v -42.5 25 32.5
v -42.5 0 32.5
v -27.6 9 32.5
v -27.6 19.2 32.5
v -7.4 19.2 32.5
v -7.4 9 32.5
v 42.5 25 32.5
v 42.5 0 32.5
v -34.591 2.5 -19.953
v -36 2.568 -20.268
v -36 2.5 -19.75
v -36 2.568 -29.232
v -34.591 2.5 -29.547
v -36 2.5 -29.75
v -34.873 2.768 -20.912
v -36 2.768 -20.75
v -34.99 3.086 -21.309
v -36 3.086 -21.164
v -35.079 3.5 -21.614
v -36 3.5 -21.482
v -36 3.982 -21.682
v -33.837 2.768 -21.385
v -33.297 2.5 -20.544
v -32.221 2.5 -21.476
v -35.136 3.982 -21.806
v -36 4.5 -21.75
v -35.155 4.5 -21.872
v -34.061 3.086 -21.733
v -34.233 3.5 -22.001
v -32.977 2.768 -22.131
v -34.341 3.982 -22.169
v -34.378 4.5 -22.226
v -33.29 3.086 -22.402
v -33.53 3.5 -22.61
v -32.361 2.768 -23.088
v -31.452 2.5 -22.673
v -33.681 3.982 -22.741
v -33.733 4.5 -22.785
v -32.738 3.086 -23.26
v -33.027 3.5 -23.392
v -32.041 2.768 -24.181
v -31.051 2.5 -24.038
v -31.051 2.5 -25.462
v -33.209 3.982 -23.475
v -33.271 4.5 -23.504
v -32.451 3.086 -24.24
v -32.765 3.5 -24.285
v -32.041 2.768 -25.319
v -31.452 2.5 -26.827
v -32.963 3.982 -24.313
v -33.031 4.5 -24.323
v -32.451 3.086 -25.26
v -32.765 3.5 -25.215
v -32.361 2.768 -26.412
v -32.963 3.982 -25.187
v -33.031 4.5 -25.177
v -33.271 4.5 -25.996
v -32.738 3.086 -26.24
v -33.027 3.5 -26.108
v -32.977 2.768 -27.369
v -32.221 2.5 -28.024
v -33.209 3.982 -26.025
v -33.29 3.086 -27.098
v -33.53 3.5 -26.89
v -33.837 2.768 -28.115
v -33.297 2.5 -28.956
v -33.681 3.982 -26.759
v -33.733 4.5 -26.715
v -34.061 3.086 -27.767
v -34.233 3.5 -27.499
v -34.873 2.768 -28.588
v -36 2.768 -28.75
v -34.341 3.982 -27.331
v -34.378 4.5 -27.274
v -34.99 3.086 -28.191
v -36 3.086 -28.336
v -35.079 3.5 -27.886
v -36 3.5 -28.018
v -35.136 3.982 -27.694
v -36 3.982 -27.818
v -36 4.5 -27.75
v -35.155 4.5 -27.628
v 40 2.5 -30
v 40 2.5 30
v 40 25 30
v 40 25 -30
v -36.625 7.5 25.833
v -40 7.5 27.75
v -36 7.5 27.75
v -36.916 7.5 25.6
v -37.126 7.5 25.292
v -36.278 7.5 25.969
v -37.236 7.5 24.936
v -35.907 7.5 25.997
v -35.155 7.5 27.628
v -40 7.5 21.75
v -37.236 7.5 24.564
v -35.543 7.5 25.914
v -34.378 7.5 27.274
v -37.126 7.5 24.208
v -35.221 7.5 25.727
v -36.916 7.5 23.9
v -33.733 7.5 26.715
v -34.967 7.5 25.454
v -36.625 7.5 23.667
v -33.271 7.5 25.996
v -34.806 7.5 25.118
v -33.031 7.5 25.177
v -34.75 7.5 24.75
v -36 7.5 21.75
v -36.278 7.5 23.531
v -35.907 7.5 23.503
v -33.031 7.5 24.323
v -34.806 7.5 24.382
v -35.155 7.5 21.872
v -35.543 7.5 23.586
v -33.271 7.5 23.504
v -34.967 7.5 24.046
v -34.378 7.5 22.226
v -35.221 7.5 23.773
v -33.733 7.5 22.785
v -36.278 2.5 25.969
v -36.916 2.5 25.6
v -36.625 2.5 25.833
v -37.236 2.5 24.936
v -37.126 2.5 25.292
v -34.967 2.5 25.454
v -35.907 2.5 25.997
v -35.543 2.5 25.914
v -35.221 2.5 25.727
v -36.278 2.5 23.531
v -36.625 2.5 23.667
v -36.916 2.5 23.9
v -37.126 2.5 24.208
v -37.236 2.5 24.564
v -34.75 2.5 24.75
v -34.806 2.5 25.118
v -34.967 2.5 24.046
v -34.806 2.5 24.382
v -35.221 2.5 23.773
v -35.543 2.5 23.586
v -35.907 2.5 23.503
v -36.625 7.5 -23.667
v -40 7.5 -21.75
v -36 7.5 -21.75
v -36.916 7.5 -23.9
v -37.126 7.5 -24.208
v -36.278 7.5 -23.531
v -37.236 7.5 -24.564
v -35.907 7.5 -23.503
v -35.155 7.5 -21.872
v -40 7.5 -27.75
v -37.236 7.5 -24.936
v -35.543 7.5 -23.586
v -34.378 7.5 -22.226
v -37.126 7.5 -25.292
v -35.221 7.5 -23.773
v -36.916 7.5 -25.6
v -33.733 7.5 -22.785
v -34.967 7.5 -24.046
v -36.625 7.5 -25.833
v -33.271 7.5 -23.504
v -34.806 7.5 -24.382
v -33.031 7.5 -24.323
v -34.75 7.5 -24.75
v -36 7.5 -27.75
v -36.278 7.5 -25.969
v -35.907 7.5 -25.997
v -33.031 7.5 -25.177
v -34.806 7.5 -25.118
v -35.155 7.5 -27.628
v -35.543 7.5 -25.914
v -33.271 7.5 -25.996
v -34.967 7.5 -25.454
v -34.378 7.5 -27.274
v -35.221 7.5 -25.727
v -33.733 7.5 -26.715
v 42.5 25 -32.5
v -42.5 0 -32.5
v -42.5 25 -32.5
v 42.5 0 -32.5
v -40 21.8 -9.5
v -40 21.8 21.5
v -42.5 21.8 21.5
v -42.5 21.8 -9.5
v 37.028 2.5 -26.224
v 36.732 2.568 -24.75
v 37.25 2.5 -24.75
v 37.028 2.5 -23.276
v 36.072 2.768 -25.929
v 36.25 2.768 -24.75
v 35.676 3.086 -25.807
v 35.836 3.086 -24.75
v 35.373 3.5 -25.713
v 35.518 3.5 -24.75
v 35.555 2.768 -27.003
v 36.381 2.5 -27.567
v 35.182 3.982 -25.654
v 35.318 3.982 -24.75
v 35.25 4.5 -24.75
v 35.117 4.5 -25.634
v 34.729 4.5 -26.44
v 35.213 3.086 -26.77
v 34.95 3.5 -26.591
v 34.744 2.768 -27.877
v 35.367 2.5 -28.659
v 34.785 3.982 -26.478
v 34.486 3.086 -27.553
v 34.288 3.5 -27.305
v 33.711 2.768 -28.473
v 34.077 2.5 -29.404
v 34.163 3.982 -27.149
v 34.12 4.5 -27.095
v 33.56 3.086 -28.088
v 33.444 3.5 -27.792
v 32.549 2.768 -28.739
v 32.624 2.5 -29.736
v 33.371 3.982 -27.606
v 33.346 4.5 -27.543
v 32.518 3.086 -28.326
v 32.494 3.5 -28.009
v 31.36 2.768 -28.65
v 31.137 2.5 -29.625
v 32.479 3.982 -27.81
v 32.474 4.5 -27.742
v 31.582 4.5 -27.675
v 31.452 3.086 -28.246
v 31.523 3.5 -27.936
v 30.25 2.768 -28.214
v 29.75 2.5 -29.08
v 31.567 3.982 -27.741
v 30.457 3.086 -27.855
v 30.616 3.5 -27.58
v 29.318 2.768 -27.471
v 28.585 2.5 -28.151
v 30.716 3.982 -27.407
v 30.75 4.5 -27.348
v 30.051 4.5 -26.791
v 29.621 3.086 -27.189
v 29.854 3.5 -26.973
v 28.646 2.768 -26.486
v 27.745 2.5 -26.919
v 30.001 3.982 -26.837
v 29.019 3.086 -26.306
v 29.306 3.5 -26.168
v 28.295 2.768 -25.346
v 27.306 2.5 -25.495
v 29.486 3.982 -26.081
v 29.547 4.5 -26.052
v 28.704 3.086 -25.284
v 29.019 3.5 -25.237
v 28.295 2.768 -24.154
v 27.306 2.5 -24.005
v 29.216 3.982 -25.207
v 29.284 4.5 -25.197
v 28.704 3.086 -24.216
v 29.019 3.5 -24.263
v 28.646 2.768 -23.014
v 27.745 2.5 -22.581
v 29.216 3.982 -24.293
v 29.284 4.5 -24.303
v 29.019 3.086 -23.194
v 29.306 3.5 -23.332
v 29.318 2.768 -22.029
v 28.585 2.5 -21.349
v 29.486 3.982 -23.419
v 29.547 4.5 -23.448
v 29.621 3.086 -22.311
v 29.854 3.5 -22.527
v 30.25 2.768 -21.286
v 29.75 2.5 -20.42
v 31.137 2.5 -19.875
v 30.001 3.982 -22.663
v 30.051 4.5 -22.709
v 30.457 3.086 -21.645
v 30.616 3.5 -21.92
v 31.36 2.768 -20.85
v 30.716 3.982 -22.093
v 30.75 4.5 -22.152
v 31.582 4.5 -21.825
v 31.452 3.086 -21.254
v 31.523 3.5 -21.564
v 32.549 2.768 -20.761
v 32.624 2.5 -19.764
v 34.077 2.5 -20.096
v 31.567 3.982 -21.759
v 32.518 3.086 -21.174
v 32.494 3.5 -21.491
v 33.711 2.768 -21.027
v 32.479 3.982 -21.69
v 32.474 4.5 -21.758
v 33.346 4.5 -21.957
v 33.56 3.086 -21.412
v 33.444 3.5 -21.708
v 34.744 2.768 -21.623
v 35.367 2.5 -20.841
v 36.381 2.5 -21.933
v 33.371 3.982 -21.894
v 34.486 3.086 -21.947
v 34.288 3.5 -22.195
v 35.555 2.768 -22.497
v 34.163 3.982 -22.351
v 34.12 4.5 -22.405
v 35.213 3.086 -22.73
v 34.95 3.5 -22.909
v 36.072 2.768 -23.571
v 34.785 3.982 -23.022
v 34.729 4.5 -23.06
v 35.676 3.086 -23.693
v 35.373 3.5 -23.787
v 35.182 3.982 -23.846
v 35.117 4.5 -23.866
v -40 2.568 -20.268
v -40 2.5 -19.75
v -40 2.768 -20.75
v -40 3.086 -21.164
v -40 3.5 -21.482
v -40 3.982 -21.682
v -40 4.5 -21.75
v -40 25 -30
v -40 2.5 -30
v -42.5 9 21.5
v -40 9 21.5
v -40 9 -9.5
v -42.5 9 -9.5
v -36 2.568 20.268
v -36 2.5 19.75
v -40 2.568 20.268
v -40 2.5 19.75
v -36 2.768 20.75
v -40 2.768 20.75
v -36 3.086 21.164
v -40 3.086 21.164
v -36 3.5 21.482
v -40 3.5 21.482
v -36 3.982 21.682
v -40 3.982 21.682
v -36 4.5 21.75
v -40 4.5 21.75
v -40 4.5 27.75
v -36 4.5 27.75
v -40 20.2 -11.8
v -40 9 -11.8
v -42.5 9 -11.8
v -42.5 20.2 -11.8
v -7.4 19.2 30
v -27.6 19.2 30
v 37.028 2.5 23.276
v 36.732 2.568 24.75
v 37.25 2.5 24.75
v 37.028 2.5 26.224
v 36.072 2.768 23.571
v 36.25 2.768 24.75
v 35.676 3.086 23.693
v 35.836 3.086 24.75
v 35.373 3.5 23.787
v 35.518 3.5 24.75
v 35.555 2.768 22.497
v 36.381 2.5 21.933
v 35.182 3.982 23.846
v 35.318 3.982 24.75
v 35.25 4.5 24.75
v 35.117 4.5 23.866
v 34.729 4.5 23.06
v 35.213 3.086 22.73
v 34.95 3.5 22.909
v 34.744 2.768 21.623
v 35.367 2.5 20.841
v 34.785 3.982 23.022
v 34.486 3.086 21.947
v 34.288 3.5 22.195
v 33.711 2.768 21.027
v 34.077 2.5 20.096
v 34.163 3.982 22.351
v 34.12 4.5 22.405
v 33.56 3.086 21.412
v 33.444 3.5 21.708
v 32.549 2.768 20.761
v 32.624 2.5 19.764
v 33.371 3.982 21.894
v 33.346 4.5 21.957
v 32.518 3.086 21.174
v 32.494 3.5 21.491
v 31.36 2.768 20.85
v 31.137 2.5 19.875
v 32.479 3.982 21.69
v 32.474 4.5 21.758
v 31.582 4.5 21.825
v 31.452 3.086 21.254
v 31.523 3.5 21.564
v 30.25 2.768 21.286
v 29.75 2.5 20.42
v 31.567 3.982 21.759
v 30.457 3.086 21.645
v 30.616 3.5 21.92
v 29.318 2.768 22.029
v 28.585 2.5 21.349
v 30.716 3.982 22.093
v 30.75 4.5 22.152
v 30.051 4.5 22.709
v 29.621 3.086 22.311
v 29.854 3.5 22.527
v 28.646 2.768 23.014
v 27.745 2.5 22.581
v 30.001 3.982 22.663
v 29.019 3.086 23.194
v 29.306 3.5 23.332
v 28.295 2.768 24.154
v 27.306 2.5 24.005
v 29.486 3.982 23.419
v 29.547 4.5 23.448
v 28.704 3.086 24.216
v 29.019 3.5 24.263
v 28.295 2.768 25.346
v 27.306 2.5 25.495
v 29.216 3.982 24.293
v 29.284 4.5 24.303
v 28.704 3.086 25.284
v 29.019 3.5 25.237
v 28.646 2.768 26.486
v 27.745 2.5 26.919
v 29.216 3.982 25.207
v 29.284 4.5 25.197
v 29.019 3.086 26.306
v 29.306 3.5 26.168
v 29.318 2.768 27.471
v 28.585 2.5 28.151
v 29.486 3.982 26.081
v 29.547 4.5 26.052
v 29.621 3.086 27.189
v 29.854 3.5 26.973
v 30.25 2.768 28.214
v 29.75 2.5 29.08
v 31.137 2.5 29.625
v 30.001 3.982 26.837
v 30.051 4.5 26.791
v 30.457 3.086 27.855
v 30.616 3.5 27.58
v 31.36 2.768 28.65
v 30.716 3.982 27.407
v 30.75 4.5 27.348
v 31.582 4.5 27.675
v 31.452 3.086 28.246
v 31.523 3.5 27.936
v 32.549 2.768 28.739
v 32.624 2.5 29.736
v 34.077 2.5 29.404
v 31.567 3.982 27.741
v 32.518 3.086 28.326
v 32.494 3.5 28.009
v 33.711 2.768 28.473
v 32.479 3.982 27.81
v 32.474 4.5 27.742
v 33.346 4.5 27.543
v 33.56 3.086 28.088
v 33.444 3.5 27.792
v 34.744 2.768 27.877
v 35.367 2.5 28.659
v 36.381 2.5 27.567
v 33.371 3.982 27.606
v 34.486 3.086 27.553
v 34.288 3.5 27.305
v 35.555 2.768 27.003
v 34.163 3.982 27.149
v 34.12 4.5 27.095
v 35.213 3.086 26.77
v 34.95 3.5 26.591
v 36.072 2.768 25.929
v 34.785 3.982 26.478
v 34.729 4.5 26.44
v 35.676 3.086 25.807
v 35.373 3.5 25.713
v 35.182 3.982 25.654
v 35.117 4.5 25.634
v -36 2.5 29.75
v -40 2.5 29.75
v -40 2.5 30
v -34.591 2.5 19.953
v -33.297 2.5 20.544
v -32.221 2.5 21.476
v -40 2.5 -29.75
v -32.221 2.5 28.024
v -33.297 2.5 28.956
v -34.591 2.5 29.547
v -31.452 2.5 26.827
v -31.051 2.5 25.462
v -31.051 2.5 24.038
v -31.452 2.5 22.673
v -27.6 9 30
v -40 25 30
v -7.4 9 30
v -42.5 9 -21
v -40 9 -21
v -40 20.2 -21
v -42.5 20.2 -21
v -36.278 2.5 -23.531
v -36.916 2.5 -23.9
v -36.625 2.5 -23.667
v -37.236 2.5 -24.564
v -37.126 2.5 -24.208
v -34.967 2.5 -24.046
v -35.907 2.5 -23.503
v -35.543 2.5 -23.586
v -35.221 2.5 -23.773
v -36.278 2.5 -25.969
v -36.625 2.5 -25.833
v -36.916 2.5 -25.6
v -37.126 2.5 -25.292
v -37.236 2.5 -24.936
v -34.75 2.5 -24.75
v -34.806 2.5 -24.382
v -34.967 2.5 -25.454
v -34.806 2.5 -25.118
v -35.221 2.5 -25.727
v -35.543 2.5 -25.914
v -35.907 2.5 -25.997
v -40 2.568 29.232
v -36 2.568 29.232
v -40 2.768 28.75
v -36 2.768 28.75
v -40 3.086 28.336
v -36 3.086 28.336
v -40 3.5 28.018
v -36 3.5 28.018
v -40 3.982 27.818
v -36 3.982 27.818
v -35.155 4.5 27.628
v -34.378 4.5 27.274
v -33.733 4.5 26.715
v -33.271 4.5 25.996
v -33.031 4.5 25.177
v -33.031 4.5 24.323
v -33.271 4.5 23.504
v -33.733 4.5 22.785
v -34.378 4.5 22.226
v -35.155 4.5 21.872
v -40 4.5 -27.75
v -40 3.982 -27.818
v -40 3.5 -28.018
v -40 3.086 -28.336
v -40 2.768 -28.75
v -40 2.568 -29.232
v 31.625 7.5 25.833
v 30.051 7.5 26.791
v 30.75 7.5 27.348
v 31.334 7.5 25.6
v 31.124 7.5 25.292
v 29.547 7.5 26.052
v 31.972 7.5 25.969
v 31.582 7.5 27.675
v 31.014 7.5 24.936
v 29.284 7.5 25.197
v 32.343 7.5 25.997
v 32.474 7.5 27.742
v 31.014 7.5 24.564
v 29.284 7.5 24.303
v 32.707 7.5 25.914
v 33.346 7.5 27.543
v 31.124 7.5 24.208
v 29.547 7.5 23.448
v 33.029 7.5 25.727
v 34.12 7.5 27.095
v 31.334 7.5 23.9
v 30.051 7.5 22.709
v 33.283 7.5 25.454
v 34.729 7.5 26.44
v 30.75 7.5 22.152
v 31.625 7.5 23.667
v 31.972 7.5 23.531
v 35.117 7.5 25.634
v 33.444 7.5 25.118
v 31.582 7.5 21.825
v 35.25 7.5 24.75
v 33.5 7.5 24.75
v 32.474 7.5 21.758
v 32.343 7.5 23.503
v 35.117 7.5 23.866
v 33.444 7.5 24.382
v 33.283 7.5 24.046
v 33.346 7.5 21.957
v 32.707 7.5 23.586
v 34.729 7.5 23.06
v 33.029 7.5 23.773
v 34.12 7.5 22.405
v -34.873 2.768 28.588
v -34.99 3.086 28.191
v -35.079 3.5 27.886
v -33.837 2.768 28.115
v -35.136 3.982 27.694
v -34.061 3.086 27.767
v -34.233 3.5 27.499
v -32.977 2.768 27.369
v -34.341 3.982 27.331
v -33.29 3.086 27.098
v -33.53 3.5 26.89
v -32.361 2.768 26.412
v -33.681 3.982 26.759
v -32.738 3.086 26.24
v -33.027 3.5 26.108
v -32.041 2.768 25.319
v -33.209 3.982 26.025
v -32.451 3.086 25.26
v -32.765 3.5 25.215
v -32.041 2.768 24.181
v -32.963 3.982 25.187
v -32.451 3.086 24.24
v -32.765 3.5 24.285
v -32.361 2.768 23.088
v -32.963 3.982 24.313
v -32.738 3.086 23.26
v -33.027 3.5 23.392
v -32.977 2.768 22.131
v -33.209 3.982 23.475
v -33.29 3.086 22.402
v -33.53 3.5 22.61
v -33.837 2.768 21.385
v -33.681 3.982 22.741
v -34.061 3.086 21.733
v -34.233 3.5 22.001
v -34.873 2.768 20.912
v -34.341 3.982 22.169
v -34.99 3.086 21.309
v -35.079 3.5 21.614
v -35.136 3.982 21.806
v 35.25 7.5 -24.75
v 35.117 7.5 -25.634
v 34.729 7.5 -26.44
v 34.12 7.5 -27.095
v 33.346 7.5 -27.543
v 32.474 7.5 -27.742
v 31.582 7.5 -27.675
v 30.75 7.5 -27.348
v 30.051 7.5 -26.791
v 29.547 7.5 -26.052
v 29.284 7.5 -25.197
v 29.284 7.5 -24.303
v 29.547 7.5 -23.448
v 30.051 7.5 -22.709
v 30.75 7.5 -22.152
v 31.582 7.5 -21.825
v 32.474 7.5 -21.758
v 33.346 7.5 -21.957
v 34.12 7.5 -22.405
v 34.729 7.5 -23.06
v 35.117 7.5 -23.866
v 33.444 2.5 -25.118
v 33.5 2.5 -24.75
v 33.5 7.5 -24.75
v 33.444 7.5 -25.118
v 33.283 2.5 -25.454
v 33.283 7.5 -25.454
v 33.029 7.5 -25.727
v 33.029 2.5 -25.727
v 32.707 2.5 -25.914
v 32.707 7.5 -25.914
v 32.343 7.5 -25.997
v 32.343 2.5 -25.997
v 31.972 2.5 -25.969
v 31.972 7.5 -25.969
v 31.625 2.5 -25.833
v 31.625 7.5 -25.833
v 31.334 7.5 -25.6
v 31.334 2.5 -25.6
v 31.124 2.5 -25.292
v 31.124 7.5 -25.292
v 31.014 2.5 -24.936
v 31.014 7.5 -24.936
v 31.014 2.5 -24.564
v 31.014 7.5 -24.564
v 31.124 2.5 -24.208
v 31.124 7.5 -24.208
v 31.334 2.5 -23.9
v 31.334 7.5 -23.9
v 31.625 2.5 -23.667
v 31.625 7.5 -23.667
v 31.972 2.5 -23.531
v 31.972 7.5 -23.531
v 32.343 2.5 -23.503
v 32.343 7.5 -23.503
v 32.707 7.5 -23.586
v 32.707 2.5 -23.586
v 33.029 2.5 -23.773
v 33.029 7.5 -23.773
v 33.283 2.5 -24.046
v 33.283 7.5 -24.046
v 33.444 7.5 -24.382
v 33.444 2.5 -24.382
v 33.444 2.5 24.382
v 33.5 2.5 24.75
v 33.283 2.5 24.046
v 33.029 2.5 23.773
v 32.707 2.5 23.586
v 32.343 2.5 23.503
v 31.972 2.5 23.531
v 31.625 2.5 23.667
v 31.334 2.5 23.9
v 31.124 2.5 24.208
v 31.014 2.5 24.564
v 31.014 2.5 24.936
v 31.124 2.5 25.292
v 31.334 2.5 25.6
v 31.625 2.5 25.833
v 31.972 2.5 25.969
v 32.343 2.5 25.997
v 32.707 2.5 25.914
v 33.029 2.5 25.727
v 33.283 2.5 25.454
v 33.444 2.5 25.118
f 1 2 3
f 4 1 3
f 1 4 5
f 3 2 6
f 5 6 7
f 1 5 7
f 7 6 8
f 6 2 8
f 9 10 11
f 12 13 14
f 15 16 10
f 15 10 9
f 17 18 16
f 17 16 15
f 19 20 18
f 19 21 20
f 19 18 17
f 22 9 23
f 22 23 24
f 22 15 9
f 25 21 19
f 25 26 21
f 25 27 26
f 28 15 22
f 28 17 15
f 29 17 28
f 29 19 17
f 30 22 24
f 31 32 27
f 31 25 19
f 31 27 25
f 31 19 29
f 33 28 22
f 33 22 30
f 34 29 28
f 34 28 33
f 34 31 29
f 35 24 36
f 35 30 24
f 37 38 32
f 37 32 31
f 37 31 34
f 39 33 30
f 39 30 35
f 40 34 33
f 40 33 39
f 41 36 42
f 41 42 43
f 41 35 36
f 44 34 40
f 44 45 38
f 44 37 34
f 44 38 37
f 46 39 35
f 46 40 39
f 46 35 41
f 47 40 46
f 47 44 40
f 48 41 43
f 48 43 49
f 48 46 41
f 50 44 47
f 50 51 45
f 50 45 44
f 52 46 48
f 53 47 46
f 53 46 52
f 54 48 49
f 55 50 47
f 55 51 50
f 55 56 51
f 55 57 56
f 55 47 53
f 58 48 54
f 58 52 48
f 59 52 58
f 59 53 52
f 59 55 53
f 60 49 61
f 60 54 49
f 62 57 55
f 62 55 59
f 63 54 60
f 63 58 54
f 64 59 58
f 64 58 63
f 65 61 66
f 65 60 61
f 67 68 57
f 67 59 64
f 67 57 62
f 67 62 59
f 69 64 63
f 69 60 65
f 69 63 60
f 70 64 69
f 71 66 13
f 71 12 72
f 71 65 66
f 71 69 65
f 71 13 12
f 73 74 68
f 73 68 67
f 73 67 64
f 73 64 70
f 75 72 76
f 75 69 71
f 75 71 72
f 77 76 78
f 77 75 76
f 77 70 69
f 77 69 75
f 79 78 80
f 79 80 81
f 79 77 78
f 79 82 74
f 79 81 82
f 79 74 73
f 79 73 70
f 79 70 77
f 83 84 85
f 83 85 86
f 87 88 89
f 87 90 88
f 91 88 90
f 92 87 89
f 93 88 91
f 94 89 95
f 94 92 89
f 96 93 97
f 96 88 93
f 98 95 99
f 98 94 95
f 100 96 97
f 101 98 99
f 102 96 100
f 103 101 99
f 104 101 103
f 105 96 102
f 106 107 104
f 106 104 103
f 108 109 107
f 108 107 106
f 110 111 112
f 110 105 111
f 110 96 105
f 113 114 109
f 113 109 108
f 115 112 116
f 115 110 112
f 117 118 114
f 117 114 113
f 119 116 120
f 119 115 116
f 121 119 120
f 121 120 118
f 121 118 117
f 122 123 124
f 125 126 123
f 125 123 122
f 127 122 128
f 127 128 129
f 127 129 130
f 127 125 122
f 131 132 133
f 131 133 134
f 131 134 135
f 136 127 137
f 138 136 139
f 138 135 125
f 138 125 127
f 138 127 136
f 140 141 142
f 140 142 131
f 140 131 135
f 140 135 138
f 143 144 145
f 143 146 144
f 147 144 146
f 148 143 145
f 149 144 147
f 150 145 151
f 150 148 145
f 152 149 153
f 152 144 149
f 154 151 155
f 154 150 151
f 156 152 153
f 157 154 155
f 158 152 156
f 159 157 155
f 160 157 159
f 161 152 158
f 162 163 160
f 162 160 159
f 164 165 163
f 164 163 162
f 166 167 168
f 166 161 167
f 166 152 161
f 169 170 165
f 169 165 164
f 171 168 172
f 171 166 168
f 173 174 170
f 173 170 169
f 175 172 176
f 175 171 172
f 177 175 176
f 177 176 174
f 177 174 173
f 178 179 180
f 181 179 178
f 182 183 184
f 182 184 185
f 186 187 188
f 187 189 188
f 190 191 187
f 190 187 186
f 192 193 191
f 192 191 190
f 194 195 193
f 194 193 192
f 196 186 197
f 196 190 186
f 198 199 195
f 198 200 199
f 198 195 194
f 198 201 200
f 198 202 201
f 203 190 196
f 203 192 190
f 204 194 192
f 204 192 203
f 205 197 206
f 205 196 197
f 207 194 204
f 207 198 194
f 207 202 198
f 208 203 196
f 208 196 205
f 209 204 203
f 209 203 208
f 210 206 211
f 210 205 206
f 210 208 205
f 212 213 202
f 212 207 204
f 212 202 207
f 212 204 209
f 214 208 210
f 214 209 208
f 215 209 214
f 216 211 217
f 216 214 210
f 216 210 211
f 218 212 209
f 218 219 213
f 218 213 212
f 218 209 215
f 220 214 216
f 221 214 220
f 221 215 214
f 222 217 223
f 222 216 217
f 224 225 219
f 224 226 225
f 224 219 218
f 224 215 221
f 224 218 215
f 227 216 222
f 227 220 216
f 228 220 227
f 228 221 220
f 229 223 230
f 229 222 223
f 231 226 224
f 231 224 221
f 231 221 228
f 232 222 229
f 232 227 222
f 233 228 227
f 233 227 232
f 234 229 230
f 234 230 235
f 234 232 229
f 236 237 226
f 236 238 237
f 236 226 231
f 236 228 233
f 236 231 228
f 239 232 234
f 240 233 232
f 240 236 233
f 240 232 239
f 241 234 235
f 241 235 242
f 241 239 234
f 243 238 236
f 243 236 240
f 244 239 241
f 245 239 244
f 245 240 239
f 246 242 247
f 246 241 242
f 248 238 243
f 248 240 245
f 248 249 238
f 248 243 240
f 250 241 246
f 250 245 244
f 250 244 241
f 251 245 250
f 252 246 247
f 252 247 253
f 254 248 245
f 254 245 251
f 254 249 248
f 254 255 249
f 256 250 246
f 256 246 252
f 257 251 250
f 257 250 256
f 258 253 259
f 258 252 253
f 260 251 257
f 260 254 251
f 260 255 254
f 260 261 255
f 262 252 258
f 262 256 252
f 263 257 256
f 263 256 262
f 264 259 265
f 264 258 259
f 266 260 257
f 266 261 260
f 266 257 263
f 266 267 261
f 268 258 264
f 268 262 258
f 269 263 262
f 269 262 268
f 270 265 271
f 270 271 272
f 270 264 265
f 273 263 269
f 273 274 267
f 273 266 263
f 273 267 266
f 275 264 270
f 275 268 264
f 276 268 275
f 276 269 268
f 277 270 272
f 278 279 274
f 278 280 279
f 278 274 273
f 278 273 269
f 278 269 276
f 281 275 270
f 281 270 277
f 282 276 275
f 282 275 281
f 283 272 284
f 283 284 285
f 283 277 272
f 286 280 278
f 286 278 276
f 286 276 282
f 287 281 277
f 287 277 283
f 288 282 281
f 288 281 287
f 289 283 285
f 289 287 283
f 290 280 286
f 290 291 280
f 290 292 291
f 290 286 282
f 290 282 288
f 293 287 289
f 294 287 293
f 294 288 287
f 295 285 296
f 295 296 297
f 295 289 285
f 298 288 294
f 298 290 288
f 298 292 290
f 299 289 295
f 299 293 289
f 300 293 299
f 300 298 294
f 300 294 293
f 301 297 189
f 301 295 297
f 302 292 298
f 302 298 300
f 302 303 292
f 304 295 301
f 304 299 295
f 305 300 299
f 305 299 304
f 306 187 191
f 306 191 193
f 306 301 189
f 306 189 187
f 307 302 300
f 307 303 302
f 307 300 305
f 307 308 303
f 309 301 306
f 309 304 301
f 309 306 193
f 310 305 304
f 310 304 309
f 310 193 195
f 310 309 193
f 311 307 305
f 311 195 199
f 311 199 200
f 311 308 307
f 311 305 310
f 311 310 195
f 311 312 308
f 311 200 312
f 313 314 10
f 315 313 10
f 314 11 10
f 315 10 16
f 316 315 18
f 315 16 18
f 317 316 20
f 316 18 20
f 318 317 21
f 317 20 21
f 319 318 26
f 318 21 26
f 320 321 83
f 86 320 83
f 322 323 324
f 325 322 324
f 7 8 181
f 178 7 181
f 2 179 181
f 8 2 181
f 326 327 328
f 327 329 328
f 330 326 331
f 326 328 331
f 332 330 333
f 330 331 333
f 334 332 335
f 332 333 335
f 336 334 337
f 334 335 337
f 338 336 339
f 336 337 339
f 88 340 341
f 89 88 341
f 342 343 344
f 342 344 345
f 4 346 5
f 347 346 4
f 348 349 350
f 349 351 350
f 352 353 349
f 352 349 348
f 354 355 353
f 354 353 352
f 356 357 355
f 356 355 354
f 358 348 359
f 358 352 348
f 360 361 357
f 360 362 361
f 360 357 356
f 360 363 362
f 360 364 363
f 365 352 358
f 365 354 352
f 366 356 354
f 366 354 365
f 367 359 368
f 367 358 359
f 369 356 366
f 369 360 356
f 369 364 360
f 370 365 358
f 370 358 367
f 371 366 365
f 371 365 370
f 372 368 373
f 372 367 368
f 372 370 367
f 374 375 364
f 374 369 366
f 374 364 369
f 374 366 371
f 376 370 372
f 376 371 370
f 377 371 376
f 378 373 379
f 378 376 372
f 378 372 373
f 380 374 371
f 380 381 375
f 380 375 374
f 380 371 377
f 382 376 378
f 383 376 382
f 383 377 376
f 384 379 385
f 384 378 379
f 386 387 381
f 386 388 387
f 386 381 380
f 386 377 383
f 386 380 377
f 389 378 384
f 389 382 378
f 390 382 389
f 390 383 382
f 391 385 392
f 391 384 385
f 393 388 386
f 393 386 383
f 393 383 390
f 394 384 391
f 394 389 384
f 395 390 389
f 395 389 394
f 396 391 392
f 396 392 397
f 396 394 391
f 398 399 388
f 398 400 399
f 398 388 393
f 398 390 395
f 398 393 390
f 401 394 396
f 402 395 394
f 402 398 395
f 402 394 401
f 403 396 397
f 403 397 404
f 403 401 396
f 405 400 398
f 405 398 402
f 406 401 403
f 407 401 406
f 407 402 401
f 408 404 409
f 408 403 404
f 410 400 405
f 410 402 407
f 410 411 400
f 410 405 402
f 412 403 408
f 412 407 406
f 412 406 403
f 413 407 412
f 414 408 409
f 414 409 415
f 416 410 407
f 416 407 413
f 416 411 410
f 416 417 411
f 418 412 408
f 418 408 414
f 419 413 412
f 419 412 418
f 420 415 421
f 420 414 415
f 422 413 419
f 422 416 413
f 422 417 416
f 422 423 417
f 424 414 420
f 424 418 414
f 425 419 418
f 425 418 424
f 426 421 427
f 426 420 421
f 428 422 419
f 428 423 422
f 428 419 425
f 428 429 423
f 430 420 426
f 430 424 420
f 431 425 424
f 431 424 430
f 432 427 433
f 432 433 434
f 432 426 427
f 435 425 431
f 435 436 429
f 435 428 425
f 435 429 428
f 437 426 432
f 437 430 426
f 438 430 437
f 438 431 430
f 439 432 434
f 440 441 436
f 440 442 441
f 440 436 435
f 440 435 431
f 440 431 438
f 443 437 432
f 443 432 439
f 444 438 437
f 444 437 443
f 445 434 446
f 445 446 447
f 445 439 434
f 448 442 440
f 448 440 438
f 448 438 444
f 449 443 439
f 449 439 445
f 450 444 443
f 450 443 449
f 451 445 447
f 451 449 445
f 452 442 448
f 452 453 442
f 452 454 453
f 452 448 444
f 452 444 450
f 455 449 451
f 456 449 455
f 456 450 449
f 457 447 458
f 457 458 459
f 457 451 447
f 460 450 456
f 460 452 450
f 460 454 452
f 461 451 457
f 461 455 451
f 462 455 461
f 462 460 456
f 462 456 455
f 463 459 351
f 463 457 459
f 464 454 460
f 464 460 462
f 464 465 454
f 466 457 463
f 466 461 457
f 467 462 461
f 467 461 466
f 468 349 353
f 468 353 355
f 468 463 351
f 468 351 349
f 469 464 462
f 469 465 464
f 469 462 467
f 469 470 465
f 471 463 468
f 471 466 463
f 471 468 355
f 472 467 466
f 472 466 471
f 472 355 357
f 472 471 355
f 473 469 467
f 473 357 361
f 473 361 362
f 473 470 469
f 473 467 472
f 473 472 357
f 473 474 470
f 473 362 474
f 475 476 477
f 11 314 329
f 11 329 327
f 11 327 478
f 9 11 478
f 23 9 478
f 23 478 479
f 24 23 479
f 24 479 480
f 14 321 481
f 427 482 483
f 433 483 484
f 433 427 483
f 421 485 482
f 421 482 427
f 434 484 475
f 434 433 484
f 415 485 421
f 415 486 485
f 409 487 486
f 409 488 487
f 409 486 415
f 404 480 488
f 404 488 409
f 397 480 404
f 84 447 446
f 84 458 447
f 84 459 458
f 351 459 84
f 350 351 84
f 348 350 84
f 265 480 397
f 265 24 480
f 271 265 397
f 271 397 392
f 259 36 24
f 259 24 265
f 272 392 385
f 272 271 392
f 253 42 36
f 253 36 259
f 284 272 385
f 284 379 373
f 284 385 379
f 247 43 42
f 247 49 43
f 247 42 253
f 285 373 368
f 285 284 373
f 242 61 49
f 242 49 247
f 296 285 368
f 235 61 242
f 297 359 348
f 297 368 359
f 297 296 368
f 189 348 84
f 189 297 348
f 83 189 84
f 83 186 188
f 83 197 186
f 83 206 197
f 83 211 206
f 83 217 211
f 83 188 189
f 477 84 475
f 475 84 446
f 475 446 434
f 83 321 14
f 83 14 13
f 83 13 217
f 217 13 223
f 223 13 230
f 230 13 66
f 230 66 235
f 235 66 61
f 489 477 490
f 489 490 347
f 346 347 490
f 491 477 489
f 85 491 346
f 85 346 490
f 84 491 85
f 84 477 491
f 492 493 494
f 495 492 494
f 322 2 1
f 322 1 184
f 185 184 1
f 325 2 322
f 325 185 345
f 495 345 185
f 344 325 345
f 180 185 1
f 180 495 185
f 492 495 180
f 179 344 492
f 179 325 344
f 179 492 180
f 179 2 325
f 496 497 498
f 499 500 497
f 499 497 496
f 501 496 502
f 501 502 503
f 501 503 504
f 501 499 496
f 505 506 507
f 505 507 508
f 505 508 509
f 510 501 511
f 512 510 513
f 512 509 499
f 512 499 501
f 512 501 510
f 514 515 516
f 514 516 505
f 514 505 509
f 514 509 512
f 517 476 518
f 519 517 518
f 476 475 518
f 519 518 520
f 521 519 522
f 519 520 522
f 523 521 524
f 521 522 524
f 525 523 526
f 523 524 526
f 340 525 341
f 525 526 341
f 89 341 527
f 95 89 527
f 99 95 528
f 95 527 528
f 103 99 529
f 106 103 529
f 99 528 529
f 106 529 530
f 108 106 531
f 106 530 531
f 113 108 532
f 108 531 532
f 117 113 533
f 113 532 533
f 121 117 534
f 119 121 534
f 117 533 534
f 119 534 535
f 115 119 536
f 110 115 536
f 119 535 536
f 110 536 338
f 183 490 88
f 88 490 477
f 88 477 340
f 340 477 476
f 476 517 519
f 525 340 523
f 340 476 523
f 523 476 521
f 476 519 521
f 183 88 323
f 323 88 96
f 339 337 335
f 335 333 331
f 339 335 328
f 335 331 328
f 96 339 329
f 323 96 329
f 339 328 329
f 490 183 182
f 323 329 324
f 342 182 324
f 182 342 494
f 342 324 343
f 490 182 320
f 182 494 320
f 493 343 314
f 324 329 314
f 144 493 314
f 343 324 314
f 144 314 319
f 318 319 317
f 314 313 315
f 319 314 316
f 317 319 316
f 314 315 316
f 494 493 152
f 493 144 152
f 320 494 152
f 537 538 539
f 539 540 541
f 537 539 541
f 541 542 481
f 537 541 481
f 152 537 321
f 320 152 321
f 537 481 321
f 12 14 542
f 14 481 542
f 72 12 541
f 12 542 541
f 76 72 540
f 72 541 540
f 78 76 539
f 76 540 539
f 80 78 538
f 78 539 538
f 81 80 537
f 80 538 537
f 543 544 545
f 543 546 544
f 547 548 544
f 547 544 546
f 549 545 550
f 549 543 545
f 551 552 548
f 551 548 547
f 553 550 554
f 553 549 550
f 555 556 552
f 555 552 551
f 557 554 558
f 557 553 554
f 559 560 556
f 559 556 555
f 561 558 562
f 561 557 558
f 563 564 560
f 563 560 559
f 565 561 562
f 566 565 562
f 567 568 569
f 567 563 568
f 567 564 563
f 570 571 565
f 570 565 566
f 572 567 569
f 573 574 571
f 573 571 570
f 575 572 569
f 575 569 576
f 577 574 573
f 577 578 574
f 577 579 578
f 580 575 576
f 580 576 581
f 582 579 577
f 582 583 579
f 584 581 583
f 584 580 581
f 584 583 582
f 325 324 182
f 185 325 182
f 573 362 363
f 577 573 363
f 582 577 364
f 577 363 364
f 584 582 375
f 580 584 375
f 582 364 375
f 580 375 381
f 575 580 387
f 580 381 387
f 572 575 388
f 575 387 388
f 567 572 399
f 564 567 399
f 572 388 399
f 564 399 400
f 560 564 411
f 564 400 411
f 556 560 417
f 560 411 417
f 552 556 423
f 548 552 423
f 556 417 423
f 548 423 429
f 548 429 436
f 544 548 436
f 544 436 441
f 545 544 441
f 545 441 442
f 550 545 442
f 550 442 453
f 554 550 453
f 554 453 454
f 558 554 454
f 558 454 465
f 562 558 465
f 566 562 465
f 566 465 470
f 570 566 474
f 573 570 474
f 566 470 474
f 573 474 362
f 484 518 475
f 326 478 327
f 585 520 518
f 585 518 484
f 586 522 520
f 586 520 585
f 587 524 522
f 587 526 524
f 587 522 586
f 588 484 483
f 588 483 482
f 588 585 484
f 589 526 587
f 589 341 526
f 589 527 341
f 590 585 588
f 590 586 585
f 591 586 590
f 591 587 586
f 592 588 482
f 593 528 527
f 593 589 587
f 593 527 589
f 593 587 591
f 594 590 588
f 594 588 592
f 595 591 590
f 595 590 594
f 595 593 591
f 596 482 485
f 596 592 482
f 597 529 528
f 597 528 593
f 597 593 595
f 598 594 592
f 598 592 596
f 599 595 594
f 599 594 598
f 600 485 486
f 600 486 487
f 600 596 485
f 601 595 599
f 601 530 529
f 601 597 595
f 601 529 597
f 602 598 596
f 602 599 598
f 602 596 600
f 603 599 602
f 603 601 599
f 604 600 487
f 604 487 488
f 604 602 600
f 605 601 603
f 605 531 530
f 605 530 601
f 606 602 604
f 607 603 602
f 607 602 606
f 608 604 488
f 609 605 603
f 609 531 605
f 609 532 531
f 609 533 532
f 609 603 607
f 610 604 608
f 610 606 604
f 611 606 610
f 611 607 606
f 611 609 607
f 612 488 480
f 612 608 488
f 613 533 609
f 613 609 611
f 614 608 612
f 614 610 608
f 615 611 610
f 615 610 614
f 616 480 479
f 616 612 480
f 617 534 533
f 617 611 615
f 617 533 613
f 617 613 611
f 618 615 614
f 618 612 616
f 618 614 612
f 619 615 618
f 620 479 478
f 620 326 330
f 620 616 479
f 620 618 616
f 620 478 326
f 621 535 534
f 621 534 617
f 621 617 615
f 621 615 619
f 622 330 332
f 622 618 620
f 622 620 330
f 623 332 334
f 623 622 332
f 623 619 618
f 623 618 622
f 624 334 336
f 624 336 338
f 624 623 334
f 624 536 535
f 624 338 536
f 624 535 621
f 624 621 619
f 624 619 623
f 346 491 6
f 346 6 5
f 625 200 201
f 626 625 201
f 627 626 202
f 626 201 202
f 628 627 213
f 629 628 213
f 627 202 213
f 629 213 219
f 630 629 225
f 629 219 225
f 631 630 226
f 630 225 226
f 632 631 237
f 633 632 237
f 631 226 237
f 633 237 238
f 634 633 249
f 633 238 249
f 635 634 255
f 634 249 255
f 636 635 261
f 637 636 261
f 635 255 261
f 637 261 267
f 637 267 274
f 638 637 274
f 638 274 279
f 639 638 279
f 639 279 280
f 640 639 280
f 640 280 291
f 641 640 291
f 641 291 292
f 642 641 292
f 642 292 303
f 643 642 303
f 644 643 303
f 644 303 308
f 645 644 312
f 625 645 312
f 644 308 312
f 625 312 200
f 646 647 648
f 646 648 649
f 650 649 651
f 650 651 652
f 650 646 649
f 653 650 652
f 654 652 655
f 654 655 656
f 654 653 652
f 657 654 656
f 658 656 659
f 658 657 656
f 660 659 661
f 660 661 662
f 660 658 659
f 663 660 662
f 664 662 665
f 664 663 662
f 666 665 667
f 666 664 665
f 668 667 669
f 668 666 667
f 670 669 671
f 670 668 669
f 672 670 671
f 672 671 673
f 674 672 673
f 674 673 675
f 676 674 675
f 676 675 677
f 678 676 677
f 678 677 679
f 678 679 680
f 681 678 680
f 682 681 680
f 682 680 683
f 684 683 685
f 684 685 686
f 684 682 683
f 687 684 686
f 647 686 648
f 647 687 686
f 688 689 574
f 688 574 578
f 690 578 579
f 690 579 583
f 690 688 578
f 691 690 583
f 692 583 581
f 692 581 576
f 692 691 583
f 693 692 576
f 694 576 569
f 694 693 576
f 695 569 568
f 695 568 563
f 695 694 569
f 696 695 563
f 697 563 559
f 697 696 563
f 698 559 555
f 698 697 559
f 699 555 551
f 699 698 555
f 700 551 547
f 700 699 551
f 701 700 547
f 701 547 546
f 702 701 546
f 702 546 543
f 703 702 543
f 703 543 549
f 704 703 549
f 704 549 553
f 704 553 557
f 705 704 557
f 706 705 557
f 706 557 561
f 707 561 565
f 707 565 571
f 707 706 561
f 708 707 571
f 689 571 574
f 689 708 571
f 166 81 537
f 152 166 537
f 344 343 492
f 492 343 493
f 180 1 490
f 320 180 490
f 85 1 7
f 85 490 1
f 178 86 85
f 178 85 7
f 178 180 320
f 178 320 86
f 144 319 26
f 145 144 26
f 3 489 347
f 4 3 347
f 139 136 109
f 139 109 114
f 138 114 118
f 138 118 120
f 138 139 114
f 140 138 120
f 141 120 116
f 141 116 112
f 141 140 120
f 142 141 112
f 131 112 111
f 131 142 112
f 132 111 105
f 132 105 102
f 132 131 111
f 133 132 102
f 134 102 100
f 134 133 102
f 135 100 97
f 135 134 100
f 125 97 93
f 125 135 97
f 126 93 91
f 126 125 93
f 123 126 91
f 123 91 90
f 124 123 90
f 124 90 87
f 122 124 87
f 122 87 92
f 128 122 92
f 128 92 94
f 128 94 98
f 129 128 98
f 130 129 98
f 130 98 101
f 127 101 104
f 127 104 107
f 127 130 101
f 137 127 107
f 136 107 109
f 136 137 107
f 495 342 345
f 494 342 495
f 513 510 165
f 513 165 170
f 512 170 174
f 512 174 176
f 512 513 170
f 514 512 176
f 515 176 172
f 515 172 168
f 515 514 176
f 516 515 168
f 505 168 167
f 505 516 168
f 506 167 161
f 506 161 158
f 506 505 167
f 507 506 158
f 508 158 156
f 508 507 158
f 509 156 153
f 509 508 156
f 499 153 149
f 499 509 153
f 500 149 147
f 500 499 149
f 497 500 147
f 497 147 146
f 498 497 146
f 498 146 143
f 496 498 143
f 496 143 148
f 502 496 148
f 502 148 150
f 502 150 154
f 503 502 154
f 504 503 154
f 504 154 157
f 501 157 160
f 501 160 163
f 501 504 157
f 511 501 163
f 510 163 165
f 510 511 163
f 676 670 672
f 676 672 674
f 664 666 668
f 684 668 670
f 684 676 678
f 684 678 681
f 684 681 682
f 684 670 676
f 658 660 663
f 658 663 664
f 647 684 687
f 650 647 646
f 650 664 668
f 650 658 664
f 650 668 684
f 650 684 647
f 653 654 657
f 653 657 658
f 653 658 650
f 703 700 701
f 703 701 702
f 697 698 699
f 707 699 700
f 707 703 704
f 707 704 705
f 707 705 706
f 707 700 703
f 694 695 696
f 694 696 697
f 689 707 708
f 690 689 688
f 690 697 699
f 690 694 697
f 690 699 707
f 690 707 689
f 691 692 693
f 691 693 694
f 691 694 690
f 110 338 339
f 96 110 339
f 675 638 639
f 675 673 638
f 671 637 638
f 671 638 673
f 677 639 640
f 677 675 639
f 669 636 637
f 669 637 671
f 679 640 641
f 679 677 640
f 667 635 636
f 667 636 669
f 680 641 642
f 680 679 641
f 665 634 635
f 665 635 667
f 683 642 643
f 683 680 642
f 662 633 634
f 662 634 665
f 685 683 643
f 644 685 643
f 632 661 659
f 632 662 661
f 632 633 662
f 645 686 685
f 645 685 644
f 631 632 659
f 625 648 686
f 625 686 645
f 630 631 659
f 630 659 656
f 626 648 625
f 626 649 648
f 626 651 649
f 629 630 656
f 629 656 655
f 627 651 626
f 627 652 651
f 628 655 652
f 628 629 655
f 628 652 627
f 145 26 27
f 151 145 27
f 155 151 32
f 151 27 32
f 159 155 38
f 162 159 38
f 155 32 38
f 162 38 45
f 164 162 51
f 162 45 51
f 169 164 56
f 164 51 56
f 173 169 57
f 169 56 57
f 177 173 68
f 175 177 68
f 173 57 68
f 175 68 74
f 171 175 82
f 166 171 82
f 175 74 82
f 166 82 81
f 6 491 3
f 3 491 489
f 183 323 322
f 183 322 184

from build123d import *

# Parameters (mm, degrees)
SKETCH_1_W          = 85
SKETCH_1_H          = 65
EXTRUDE_1_DEPTH     = 25
SHELL_1_T           = -2.5
SKETCH_2_R          = 3
SKETCH_2_R_2        = 1.25
EXTRUDE_2_DEPTH     = 5
SKETCH_3_W          = 20.2
SKETCH_3_H          = 10.2
CUT_EXTRUDE_1_DEPTH = 3.5
SKETCH_4_W          = 9.2
SKETCH_4_H          = 11.2
SKETCH_4_W_2        = 31
SKETCH_4_H_2        = 12.8
CUT_EXTRUDE_2_DEPTH = 3.5
FILLET_1_R          = 2


with BuildPart() as part:
    # 草图1 → 凸台-拉伸1 (new body)
    with BuildSketch(Plane(origin=(0, 0, 0), x_dir=(1, 0, 0), z_dir=(0, 1, 0))):
        Rectangle(SKETCH_1_W, SKETCH_1_H)
    extrude(amount=EXTRUDE_1_DEPTH)

    # 抽壳1
    shell_1_openings = [part.faces().sort_by_distance(p)[0] for p in [
        (0, 25, 0),
    ]]
    offset(amount=SHELL_1_T, openings=shell_1_openings, kind=Kind.INTERSECTION)

    # 草图2 → 凸台-拉伸2 (add)
    with BuildSketch(Plane(origin=(0, 2.5, 0), x_dir=(1, 0, 0), z_dir=(0, 1, 0))):
        with Locations((32.25, 24.75)):
            Circle(SKETCH_2_R)
        with Locations((32.25, 24.75)):
            Circle(SKETCH_2_R_2, mode=Mode.SUBTRACT)
        with Locations((32.25, -24.75)):
            Circle(SKETCH_2_R)
        with Locations((32.25, -24.75)):
            Circle(SKETCH_2_R_2, mode=Mode.SUBTRACT)
        with BuildLine():
            Line((-36, 27.75), (-40, 27.75))
            Line((-40, 27.75), (-40, 21.75))
            Line((-40, 21.75), (-36, 21.75))
            ThreePointArc((-36, 21.75), (-33, 24.75), (-36, 27.75))
        make_face()
        with Locations((-36, 24.75)):
            Circle(SKETCH_2_R_2, mode=Mode.SUBTRACT)
        with BuildLine():
            Line((-36, -21.75), (-40, -21.75))
            Line((-40, -21.75), (-40, -27.75))
            Line((-40, -27.75), (-36, -27.75))
            ThreePointArc((-36, -27.75), (-33, -24.75), (-36, -21.75))
        make_face()
        with Locations((-36, -24.75)):
            Circle(SKETCH_2_R_2, mode=Mode.SUBTRACT)
    extrude(amount=EXTRUDE_2_DEPTH)

    # 草图3 → 切除-拉伸1 (cut, through all)
    with BuildSketch(Plane(origin=(0, 0, 30), x_dir=(-1, 0, 0), z_dir=(0, 0, -1))):
        with Locations((17.5, 14.1)):
            Rectangle(SKETCH_3_W, SKETCH_3_H)
    extrude(amount=-CUT_EXTRUDE_1_DEPTH, mode=Mode.SUBTRACT)

    # 草图4 → 切除-拉伸2 (cut, through all)
    with BuildSketch(Plane(origin=(-40, 0, 0), x_dir=(0, 0, -1), z_dir=(1, 0, 0))):
        with Locations((16.4, 14.6)):
            Rectangle(SKETCH_4_W, SKETCH_4_H)
        with Locations((-6, 15.4)):
            Rectangle(SKETCH_4_W_2, SKETCH_4_H_2)
    extrude(amount=-CUT_EXTRUDE_2_DEPTH, mode=Mode.SUBTRACT)

    # 圆角1
    fillet_1_edges = [part.edges().sort_by_distance(p)[0] for p in [
        (29.25, 2.5, -24.75),
        (29.25, 2.5, 24.75),
        (-33, 2.5, -24.75),
        (-38, 2.5, -27.75),
        (-38, 2.5, -21.75),
        (-33, 2.5, 24.75),
        (-38, 2.5, 21.75),
        (-38, 2.5, 27.75),
    ]]
    fillet(fillet_1_edges, radius=FILLET_1_R)


solid = part.part
